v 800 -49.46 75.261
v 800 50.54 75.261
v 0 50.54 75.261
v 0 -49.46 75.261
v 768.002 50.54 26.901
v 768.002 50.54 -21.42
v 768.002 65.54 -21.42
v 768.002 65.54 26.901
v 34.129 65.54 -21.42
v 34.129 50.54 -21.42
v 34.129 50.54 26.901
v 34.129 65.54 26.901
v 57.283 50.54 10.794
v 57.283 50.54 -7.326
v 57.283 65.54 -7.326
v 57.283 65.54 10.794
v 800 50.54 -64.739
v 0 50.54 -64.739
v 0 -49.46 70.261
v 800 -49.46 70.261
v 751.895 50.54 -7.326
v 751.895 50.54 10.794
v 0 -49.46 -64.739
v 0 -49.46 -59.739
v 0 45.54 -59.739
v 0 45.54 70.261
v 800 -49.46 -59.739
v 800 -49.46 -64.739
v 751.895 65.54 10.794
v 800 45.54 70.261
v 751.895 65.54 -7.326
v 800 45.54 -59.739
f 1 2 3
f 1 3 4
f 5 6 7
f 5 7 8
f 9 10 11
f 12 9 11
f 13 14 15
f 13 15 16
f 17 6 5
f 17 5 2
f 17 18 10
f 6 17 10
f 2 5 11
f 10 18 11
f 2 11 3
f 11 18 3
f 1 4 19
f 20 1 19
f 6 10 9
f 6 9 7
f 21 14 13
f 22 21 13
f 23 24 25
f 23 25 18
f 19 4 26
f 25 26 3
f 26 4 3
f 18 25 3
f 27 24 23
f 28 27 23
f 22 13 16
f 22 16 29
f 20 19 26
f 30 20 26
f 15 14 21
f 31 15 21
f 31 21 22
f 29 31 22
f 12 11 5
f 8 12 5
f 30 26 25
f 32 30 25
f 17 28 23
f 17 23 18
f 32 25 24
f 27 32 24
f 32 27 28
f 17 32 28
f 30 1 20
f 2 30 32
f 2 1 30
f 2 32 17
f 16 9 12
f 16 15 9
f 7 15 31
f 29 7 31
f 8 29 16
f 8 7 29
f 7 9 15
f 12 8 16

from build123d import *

# Parameters (mm, degrees)
PAD_DEPTH     = 800
SKETCH001_W   = 48.320911
SKETCH001_H   = 733.872097
SKETCH001_W_2 = 18.120416
SKETCH001_H_2 = 694.611473
PAD001_DEPTH  = 15


with BuildPart() as part:
    # Sketch → Pad (new body)
    with BuildSketch(Plane.YZ):
        Polygon((-49.460372, 70.261276), (45.539628, 70.261276), (45.539628, -59.738724), (-49.460372, -59.738724), (-49.460372, -64.738724), (50.539628, -64.738724), (50.539628, 75.261276), (-49.460372, 75.261276), align=None)
    extrude(amount=PAD_DEPTH)

    # Sketch001 → Pad001 (join)
    with BuildSketch(Plane.ZX.offset(50.539628)):
        with Locations((2.740473, 401.065539)):
            Rectangle(SKETCH001_W, SKETCH001_H)
        with Locations((1.733778, 404.588916)):
            Rectangle(SKETCH001_W_2, SKETCH001_H_2, mode=Mode.SUBTRACT)
    extrude(amount=PAD001_DEPTH)


solid = part.part
